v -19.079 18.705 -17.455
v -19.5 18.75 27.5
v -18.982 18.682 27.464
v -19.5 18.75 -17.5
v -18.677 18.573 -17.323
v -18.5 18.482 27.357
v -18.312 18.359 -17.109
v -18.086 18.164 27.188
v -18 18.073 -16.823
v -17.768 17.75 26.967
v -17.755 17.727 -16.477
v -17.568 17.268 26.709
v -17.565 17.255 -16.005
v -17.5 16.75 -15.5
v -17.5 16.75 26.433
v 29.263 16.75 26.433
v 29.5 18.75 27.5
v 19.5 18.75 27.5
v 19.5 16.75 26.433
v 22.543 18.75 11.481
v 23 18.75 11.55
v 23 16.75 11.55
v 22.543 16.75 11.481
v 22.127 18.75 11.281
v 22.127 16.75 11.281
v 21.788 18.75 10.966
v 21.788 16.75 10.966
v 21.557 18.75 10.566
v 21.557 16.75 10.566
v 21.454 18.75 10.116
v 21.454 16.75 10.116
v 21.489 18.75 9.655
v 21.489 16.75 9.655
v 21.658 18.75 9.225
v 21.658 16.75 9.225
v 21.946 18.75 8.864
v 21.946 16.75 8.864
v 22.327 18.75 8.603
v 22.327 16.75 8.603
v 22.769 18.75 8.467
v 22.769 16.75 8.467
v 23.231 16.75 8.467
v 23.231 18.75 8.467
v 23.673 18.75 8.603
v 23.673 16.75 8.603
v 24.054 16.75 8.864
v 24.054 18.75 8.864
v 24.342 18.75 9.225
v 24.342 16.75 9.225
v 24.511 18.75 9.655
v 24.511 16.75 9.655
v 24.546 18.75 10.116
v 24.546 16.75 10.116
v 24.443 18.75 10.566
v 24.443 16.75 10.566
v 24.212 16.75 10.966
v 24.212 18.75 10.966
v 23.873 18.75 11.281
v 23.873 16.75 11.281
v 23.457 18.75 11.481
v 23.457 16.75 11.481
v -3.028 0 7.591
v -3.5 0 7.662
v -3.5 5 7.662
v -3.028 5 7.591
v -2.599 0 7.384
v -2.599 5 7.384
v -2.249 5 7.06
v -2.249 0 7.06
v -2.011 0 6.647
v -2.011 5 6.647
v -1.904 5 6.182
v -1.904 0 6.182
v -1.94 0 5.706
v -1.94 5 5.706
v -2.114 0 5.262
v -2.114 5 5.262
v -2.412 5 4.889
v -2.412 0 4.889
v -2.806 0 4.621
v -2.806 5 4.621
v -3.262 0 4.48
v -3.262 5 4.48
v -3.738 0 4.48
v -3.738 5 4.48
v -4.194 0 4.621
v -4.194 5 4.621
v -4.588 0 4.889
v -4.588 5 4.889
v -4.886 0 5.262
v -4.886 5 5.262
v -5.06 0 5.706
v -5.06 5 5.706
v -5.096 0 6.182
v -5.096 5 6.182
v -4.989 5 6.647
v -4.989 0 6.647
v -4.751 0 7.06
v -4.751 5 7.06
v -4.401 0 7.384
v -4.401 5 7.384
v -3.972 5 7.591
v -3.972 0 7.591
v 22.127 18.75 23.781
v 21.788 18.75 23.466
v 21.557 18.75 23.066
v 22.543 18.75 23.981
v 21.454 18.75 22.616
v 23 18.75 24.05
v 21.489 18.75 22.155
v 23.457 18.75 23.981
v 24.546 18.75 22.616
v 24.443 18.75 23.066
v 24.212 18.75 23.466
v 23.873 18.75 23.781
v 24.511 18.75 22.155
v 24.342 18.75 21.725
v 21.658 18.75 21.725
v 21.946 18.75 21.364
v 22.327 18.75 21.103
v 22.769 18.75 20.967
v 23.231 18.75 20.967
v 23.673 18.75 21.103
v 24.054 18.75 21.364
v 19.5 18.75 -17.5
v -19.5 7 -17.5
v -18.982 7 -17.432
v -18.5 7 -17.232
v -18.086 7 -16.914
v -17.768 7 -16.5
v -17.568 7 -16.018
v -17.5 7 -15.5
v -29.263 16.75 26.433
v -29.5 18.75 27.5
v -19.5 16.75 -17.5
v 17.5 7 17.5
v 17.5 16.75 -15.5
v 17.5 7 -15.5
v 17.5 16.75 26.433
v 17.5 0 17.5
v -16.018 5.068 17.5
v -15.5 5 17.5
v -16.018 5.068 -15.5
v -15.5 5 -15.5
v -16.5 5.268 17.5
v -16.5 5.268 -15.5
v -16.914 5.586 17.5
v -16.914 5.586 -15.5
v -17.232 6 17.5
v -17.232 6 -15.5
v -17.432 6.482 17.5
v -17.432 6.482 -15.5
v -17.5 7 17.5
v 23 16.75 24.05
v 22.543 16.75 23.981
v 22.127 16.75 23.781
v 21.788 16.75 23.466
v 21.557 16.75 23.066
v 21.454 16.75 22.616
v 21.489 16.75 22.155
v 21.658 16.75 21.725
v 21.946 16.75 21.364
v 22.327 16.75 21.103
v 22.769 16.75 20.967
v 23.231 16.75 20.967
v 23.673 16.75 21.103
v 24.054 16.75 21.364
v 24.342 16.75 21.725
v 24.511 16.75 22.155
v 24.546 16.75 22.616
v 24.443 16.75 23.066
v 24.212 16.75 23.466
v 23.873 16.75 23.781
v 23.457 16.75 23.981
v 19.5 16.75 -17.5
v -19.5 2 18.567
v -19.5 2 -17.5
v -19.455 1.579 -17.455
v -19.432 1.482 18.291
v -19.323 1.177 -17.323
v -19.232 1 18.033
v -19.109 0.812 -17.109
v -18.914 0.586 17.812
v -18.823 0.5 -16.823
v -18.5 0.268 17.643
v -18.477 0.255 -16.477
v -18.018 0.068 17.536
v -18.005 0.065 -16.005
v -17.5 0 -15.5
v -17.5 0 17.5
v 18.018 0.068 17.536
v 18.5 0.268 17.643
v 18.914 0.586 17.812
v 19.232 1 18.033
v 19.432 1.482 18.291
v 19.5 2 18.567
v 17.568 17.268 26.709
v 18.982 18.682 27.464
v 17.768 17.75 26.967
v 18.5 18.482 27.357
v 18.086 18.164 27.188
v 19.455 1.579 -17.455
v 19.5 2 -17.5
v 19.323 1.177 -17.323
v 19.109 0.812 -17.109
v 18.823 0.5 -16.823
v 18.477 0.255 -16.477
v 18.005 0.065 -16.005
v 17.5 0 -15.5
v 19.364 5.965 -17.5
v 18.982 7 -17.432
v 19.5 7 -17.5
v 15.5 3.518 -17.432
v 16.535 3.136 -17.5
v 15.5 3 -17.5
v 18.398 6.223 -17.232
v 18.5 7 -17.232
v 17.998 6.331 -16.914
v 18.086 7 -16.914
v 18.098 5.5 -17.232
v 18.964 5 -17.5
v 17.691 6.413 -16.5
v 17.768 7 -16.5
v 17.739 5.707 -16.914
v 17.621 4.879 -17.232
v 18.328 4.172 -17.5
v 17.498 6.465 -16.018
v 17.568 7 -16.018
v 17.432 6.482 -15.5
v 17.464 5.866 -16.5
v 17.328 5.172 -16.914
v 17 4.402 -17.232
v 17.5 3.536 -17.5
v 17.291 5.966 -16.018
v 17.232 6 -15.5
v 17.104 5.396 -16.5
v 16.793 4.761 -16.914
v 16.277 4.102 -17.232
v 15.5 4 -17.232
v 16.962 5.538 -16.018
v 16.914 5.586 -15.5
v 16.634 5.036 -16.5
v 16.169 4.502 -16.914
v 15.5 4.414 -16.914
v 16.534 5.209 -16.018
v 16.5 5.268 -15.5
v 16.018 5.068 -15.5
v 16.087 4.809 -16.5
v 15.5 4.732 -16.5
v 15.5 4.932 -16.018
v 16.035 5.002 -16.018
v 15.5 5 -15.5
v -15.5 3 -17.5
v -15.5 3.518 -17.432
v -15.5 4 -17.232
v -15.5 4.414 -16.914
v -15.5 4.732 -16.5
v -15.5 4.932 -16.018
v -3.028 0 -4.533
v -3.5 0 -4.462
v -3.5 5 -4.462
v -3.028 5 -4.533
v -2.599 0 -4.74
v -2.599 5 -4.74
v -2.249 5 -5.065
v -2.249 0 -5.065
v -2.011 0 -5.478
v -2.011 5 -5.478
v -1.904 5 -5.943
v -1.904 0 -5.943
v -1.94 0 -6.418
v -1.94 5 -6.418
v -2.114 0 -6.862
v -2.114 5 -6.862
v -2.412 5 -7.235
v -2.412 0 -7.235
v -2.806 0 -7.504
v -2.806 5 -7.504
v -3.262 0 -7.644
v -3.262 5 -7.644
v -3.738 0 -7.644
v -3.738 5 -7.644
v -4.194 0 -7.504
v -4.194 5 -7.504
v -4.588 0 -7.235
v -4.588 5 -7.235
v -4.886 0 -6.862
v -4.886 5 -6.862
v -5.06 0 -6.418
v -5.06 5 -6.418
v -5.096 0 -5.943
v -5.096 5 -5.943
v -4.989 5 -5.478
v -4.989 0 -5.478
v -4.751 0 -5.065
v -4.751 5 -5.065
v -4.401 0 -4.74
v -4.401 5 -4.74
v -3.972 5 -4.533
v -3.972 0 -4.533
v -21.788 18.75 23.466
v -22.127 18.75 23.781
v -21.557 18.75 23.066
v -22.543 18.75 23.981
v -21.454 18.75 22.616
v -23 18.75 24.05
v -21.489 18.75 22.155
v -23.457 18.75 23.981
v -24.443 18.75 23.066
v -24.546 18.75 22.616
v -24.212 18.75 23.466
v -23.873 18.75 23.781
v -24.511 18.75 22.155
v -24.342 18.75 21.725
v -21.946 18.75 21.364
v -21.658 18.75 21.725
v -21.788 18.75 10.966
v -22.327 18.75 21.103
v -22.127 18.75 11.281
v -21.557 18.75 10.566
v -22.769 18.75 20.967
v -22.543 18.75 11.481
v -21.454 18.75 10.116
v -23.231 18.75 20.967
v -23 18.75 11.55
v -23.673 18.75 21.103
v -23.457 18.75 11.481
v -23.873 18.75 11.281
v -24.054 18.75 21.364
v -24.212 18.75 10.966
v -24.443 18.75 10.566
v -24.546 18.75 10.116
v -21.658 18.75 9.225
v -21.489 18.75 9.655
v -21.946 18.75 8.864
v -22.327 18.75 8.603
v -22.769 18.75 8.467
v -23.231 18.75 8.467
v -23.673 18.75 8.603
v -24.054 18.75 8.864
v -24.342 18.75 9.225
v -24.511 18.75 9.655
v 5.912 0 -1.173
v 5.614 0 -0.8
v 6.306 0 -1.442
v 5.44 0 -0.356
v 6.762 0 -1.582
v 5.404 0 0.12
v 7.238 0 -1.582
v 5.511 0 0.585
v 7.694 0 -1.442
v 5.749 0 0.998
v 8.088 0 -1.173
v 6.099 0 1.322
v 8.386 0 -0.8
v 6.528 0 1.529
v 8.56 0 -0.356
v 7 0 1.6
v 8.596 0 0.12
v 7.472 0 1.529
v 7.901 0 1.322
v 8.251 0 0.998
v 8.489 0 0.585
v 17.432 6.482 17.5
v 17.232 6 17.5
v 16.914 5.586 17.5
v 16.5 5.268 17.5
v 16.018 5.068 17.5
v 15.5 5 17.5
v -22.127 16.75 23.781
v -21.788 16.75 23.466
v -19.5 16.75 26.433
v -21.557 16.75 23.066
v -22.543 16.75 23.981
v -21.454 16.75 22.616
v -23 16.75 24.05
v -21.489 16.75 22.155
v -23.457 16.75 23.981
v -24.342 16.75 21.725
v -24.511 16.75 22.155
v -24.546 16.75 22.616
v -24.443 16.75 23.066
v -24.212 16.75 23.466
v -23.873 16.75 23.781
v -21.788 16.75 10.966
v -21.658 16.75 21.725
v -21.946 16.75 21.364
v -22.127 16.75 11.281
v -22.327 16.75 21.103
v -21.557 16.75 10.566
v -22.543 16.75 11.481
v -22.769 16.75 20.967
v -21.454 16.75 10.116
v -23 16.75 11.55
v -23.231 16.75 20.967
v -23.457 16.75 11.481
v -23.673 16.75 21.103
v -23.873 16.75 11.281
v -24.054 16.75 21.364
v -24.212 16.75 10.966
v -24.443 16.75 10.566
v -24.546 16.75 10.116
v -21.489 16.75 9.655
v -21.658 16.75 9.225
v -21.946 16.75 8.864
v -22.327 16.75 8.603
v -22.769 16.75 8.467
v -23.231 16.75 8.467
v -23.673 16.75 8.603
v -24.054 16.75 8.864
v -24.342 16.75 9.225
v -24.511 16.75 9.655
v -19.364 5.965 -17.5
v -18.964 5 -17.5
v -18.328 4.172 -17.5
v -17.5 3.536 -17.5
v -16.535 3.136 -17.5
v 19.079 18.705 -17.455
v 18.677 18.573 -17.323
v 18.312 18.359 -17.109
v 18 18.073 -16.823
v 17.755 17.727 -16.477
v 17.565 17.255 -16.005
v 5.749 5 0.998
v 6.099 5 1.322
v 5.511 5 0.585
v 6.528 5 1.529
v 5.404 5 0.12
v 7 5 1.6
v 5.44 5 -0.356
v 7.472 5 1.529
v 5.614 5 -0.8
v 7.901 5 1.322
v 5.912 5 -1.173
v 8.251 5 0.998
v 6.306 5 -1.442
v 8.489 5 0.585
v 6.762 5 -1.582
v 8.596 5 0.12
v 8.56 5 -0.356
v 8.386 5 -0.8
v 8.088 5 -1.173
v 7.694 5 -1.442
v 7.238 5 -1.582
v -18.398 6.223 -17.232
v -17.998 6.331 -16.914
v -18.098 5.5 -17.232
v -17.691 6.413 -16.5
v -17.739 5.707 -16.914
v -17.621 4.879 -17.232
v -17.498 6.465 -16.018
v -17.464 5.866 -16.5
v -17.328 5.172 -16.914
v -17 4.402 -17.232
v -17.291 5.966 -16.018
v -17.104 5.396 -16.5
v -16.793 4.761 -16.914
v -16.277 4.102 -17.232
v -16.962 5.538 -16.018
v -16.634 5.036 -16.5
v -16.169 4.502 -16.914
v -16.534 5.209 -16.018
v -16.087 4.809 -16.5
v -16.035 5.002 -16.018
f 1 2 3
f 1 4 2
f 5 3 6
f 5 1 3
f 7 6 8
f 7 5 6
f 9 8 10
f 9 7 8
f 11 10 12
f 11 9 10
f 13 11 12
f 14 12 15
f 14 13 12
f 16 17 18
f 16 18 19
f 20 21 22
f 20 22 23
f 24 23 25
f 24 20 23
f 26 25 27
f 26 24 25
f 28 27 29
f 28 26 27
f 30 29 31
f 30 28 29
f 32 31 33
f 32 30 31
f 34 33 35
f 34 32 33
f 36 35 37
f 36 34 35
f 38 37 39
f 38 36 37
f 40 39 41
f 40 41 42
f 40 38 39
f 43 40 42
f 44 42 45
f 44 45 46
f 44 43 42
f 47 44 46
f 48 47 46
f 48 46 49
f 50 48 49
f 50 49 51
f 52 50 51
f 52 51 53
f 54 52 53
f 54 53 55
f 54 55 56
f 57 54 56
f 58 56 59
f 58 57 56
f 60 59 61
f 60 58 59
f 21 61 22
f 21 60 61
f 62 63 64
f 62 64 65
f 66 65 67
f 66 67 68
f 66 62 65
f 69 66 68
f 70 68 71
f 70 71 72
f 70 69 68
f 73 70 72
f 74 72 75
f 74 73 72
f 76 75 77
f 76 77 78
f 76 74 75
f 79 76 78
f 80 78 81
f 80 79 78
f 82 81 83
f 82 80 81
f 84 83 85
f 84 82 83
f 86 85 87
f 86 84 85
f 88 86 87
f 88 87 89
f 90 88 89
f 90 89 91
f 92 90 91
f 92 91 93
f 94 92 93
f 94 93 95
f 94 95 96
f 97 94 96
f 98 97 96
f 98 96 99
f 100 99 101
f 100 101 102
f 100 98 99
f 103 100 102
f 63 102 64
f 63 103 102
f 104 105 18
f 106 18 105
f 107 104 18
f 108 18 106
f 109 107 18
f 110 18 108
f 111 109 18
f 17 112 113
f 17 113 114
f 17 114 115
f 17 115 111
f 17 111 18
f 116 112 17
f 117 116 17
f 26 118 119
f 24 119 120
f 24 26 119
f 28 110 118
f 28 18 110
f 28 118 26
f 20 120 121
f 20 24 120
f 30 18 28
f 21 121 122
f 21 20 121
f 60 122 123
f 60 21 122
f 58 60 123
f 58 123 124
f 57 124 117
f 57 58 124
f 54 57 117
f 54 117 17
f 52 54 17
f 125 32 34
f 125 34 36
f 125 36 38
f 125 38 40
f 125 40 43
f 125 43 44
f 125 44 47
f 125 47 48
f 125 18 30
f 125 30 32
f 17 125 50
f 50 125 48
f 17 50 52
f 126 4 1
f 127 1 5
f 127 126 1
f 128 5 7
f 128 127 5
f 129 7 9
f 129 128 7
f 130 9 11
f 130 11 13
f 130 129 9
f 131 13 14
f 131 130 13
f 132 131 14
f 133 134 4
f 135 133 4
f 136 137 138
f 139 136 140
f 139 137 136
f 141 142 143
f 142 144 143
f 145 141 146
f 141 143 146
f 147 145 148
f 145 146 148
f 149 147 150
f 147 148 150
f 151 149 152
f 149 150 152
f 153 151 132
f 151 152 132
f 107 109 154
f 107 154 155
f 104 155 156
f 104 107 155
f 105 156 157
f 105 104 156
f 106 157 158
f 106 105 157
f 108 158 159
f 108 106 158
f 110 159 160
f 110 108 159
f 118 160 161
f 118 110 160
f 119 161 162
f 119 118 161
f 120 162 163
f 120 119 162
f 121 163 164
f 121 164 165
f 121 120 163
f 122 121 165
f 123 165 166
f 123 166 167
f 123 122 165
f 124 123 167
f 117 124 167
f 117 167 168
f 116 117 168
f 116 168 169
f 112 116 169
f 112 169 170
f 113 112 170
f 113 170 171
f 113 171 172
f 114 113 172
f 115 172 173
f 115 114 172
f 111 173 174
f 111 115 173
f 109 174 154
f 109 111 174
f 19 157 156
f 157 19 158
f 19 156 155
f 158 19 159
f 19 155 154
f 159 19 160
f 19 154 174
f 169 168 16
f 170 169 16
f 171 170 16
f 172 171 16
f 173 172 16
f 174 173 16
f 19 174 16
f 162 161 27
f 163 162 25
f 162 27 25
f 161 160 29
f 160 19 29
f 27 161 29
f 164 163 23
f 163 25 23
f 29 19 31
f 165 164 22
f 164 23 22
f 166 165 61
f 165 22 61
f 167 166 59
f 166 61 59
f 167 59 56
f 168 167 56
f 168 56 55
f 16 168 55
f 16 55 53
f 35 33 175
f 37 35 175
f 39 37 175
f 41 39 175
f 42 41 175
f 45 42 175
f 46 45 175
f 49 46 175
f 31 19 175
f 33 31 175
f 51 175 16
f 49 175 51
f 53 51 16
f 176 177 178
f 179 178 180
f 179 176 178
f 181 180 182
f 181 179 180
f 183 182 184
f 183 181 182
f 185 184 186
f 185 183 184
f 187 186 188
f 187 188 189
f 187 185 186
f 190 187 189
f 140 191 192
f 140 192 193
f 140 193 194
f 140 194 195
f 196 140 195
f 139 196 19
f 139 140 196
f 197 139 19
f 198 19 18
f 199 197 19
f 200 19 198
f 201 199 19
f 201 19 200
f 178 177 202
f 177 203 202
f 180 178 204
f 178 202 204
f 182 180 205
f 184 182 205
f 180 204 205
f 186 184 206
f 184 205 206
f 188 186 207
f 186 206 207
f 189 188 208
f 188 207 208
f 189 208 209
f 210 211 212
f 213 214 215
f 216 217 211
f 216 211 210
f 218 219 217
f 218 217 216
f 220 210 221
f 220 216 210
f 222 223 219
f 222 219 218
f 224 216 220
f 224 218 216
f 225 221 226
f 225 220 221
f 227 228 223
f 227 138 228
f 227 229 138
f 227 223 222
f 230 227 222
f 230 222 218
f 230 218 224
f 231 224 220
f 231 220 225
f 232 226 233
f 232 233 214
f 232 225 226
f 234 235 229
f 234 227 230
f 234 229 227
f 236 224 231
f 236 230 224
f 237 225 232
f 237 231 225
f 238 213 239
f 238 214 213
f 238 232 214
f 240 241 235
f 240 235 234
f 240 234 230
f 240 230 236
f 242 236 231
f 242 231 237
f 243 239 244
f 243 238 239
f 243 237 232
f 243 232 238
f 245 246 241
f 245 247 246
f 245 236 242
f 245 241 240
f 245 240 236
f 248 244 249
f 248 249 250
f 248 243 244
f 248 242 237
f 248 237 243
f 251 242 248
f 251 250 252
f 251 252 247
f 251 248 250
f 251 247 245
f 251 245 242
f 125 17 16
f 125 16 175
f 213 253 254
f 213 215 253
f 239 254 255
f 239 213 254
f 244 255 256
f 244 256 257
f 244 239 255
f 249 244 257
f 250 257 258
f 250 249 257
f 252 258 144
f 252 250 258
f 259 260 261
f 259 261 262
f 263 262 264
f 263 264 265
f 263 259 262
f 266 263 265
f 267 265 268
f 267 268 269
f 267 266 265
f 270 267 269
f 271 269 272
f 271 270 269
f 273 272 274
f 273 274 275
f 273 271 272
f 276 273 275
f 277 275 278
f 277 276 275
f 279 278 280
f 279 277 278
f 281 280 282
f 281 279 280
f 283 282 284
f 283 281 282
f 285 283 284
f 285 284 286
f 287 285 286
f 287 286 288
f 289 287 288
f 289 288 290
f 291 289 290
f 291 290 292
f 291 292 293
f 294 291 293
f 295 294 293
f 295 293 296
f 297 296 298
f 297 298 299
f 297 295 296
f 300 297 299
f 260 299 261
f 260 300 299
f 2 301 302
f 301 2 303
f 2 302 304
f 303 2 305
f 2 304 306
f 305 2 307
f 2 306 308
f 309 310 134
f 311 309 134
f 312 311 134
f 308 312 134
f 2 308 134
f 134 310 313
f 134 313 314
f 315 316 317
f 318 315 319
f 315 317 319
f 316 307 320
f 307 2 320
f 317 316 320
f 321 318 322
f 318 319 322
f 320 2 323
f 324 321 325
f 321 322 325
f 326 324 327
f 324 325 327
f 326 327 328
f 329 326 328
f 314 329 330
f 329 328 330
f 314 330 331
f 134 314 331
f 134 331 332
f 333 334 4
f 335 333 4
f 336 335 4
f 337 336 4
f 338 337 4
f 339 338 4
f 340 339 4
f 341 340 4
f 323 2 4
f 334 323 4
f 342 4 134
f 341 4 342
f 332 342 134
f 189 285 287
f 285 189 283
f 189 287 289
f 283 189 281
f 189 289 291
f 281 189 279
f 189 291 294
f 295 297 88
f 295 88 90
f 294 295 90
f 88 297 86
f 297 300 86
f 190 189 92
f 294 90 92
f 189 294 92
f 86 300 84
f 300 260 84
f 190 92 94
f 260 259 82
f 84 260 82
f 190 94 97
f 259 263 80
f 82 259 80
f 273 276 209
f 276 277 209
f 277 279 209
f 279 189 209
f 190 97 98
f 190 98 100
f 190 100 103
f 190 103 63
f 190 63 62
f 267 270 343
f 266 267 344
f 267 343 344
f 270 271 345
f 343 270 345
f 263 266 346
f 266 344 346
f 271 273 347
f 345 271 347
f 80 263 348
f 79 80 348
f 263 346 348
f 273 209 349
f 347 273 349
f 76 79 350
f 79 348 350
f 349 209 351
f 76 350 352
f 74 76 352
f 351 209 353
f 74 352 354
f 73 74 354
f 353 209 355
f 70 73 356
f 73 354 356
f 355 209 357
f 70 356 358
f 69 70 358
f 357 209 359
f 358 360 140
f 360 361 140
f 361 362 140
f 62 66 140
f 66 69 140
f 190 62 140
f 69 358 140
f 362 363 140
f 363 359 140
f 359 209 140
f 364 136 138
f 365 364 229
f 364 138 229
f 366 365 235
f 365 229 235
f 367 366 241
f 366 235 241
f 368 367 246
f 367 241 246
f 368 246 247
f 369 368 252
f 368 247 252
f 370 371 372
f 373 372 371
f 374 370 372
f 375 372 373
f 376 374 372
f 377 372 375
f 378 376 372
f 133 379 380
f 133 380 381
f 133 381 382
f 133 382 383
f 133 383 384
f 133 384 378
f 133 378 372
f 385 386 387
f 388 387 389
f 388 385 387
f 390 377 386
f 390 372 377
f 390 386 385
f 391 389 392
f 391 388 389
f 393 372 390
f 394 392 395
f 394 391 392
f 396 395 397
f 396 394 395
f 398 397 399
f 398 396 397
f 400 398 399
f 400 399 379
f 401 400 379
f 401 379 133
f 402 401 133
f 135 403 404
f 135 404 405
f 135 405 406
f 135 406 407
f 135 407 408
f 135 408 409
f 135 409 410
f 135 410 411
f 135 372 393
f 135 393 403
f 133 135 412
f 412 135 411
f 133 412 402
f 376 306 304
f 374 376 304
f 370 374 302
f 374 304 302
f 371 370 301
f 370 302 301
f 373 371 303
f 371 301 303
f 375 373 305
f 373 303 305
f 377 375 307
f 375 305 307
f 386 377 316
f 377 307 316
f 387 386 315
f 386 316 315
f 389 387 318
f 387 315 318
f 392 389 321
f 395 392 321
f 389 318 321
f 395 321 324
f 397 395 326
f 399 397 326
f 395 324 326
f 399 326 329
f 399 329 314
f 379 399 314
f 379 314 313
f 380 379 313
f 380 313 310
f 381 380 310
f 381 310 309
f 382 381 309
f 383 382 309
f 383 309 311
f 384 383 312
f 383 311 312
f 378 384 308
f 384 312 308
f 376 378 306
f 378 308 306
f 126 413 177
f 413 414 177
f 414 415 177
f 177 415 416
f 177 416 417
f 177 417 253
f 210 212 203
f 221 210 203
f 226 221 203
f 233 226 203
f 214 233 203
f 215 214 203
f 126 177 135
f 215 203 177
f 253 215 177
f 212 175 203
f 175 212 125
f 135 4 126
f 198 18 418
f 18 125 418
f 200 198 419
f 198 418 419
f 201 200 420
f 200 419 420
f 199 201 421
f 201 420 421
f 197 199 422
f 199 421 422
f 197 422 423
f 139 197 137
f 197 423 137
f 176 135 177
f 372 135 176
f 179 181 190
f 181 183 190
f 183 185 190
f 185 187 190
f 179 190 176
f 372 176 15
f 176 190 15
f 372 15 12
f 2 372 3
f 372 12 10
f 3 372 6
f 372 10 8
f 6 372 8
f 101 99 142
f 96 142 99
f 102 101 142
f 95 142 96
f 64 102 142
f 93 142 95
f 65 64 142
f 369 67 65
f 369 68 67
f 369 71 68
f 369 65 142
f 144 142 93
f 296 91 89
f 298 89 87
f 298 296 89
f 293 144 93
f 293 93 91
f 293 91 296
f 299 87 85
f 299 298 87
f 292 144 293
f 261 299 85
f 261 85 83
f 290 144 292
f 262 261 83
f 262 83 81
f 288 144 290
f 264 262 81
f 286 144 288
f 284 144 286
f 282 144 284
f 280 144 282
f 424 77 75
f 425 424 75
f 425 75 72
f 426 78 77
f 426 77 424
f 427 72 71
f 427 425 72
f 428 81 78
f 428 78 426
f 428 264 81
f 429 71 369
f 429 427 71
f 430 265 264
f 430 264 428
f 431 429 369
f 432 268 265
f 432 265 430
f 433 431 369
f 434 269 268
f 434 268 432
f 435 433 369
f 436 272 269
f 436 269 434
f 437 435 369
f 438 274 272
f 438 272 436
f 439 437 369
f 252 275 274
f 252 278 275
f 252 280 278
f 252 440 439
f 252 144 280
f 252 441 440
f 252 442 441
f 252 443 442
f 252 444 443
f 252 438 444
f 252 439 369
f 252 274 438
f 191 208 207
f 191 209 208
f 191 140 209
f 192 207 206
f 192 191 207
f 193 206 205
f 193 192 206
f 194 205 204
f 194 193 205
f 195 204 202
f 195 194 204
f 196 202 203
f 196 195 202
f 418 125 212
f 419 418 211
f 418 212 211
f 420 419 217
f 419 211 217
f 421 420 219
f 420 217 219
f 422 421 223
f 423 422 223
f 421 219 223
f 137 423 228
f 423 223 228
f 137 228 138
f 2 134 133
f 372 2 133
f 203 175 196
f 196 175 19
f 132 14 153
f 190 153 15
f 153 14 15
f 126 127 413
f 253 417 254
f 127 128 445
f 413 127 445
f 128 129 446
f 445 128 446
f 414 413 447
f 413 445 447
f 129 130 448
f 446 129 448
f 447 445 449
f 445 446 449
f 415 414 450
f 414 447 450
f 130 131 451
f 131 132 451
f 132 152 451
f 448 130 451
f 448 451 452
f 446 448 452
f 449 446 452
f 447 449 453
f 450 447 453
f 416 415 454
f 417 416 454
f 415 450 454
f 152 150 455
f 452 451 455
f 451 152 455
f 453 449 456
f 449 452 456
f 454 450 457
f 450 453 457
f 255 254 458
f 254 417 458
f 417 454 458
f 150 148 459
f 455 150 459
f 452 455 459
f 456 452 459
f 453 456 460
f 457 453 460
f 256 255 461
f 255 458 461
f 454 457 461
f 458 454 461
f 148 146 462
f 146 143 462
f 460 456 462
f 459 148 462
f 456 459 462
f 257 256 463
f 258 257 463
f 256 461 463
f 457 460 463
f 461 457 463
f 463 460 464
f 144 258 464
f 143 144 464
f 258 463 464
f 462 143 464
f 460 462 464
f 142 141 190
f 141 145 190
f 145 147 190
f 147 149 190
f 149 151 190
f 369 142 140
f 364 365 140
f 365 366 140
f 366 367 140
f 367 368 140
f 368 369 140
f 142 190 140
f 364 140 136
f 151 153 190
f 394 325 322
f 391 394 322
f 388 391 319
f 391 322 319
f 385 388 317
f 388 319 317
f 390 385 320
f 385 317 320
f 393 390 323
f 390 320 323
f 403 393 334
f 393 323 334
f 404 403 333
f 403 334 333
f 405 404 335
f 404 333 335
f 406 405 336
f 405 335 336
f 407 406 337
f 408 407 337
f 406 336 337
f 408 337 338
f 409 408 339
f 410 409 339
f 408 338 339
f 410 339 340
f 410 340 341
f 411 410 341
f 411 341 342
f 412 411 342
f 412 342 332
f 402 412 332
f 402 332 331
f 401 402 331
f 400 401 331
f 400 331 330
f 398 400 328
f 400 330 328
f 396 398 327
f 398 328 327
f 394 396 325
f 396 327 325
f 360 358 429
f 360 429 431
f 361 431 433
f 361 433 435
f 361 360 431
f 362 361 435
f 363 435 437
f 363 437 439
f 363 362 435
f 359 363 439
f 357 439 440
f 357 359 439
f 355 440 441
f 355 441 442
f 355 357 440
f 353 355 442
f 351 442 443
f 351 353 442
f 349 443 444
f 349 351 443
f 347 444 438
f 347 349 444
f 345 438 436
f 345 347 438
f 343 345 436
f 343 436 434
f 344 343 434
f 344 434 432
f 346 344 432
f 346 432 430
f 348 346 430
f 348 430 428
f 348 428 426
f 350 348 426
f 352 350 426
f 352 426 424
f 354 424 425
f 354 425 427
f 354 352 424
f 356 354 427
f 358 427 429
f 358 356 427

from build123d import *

# Parameters (mm, degrees)
SKETCH2_W           = 35
SKETCH2_H           = 35
SKETCH2_R           = 1.6
BOSS_EXTRUDE1_DEPTH = 5
BOSS_EXTRUDE2_DEPTH = 2
SKETCH4_R           = 1.55
BOSS_EXTRUDE3_DEPTH = 2
CUT_EXTRUDE1_DEPTH  = 52.27194652
FILLET1_R           = 2


with BuildPart() as part:
    # Sketch2 → Boss-Extrude1 (new body)
    with BuildSketch(Plane(origin=(0, 0, 0), x_dir=(1, 0, 0), z_dir=(0, 1, 0))):
        Rectangle(SKETCH2_W, SKETCH2_H)
        with Locations(Location((7, 0, 0), (0, 0, 270))):
            Circle(SKETCH2_R, mode=Mode.SUBTRACT)
        with Locations(Location((-3.5, -6.062177826, 0), (0, 0, 270))):
            Circle(SKETCH2_R, mode=Mode.SUBTRACT)
        with Locations(Location((-3.5, 6.062177826, 0), (0, 0, 270))):
            Circle(SKETCH2_R, mode=Mode.SUBTRACT)
    extrude(amount=BOSS_EXTRUDE1_DEPTH)

    # Sketch3 → Boss-Extrude2 (add)
    with BuildSketch(Plane(origin=(17.5, 0, 0), x_dir=(0, 0, -1), z_dir=(1, 0, 0))):
        Polygon((-17.5, 0), (-27.5, 18.75), (17.5, 18.75), (17.5, 0), align=None)
    boss_extrude2 = extrude(amount=BOSS_EXTRUDE2_DEPTH)

    # Mirror1: Boss-Extrude2 across plane
    add(boss_extrude2.mirror(Plane(origin=(0, 0, 0), x_dir=(0, 0, 1), z_dir=(1, 0, 0))))

    # Sketch4 → Boss-Extrude3 (add)
    with BuildSketch(Plane(origin=(0, 18.75, 0), x_dir=(1, 0, 0), z_dir=(0, 1, 0))):
        Polygon((-19.5, -27.5), (-29.5, -27.5), (-19.5, 17.5), align=None)
        with Locations(Location((-23, -22.5, 0), (0, 0, 270))):
            Circle(SKETCH4_R, mode=Mode.SUBTRACT)
        with Locations(Location((-23, -10, 0), (0, 0, 270))):
            Circle(SKETCH4_R, mode=Mode.SUBTRACT)
    boss_extrude3 = extrude(amount=-BOSS_EXTRUDE3_DEPTH)

    # Sketch5 → Cut-Extrude1 (cut, through all)
    with BuildSketch(Plane(origin=(-19.5, 0, 0), x_dir=(0, 0, -1), z_dir=(1, 0, 0))):
        Polygon((-27.5, 18.75), (-26.433333333, 16.75), (-27.5, 16.75), align=None)
    cut_extrude1 = extrude(amount=-CUT_EXTRUDE1_DEPTH, mode=Mode.SUBTRACT)

    # Mirror2: Boss-Extrude3, Cut-Extrude1 across plane
    add(boss_extrude3.mirror(Plane(origin=(0, 0, 0), x_dir=(0, 0, 1), z_dir=(1, 0, 0))))
    add(cut_extrude1.mirror(Plane(origin=(0, 0, 0), x_dir=(0, 0, 1), z_dir=(1, 0, 0))), mode=Mode.SUBTRACT)

    # Fillet1
    fillet1_edges = [part.edges().sort_by_distance(p)[0] for p in [
        (17.5, 11.875, -17.5),
        (-17.5, 11.875, -17.5),
        (-17.5, 18.75, 5),
        (17.5, 18.75, 5),
        (0, 5, -17.5),
        (0, 0, -17.5),
        (17.5, 5, 0),
        (-17.5, 5, 0),
        (-19.5, 0, 0),
        (19.5, 0, 0),
    ]]
    fillet(fillet1_edges, radius=FILLET1_R - 0.0001)  # a hair under: the kernel refuses the full size


solid = part.part
